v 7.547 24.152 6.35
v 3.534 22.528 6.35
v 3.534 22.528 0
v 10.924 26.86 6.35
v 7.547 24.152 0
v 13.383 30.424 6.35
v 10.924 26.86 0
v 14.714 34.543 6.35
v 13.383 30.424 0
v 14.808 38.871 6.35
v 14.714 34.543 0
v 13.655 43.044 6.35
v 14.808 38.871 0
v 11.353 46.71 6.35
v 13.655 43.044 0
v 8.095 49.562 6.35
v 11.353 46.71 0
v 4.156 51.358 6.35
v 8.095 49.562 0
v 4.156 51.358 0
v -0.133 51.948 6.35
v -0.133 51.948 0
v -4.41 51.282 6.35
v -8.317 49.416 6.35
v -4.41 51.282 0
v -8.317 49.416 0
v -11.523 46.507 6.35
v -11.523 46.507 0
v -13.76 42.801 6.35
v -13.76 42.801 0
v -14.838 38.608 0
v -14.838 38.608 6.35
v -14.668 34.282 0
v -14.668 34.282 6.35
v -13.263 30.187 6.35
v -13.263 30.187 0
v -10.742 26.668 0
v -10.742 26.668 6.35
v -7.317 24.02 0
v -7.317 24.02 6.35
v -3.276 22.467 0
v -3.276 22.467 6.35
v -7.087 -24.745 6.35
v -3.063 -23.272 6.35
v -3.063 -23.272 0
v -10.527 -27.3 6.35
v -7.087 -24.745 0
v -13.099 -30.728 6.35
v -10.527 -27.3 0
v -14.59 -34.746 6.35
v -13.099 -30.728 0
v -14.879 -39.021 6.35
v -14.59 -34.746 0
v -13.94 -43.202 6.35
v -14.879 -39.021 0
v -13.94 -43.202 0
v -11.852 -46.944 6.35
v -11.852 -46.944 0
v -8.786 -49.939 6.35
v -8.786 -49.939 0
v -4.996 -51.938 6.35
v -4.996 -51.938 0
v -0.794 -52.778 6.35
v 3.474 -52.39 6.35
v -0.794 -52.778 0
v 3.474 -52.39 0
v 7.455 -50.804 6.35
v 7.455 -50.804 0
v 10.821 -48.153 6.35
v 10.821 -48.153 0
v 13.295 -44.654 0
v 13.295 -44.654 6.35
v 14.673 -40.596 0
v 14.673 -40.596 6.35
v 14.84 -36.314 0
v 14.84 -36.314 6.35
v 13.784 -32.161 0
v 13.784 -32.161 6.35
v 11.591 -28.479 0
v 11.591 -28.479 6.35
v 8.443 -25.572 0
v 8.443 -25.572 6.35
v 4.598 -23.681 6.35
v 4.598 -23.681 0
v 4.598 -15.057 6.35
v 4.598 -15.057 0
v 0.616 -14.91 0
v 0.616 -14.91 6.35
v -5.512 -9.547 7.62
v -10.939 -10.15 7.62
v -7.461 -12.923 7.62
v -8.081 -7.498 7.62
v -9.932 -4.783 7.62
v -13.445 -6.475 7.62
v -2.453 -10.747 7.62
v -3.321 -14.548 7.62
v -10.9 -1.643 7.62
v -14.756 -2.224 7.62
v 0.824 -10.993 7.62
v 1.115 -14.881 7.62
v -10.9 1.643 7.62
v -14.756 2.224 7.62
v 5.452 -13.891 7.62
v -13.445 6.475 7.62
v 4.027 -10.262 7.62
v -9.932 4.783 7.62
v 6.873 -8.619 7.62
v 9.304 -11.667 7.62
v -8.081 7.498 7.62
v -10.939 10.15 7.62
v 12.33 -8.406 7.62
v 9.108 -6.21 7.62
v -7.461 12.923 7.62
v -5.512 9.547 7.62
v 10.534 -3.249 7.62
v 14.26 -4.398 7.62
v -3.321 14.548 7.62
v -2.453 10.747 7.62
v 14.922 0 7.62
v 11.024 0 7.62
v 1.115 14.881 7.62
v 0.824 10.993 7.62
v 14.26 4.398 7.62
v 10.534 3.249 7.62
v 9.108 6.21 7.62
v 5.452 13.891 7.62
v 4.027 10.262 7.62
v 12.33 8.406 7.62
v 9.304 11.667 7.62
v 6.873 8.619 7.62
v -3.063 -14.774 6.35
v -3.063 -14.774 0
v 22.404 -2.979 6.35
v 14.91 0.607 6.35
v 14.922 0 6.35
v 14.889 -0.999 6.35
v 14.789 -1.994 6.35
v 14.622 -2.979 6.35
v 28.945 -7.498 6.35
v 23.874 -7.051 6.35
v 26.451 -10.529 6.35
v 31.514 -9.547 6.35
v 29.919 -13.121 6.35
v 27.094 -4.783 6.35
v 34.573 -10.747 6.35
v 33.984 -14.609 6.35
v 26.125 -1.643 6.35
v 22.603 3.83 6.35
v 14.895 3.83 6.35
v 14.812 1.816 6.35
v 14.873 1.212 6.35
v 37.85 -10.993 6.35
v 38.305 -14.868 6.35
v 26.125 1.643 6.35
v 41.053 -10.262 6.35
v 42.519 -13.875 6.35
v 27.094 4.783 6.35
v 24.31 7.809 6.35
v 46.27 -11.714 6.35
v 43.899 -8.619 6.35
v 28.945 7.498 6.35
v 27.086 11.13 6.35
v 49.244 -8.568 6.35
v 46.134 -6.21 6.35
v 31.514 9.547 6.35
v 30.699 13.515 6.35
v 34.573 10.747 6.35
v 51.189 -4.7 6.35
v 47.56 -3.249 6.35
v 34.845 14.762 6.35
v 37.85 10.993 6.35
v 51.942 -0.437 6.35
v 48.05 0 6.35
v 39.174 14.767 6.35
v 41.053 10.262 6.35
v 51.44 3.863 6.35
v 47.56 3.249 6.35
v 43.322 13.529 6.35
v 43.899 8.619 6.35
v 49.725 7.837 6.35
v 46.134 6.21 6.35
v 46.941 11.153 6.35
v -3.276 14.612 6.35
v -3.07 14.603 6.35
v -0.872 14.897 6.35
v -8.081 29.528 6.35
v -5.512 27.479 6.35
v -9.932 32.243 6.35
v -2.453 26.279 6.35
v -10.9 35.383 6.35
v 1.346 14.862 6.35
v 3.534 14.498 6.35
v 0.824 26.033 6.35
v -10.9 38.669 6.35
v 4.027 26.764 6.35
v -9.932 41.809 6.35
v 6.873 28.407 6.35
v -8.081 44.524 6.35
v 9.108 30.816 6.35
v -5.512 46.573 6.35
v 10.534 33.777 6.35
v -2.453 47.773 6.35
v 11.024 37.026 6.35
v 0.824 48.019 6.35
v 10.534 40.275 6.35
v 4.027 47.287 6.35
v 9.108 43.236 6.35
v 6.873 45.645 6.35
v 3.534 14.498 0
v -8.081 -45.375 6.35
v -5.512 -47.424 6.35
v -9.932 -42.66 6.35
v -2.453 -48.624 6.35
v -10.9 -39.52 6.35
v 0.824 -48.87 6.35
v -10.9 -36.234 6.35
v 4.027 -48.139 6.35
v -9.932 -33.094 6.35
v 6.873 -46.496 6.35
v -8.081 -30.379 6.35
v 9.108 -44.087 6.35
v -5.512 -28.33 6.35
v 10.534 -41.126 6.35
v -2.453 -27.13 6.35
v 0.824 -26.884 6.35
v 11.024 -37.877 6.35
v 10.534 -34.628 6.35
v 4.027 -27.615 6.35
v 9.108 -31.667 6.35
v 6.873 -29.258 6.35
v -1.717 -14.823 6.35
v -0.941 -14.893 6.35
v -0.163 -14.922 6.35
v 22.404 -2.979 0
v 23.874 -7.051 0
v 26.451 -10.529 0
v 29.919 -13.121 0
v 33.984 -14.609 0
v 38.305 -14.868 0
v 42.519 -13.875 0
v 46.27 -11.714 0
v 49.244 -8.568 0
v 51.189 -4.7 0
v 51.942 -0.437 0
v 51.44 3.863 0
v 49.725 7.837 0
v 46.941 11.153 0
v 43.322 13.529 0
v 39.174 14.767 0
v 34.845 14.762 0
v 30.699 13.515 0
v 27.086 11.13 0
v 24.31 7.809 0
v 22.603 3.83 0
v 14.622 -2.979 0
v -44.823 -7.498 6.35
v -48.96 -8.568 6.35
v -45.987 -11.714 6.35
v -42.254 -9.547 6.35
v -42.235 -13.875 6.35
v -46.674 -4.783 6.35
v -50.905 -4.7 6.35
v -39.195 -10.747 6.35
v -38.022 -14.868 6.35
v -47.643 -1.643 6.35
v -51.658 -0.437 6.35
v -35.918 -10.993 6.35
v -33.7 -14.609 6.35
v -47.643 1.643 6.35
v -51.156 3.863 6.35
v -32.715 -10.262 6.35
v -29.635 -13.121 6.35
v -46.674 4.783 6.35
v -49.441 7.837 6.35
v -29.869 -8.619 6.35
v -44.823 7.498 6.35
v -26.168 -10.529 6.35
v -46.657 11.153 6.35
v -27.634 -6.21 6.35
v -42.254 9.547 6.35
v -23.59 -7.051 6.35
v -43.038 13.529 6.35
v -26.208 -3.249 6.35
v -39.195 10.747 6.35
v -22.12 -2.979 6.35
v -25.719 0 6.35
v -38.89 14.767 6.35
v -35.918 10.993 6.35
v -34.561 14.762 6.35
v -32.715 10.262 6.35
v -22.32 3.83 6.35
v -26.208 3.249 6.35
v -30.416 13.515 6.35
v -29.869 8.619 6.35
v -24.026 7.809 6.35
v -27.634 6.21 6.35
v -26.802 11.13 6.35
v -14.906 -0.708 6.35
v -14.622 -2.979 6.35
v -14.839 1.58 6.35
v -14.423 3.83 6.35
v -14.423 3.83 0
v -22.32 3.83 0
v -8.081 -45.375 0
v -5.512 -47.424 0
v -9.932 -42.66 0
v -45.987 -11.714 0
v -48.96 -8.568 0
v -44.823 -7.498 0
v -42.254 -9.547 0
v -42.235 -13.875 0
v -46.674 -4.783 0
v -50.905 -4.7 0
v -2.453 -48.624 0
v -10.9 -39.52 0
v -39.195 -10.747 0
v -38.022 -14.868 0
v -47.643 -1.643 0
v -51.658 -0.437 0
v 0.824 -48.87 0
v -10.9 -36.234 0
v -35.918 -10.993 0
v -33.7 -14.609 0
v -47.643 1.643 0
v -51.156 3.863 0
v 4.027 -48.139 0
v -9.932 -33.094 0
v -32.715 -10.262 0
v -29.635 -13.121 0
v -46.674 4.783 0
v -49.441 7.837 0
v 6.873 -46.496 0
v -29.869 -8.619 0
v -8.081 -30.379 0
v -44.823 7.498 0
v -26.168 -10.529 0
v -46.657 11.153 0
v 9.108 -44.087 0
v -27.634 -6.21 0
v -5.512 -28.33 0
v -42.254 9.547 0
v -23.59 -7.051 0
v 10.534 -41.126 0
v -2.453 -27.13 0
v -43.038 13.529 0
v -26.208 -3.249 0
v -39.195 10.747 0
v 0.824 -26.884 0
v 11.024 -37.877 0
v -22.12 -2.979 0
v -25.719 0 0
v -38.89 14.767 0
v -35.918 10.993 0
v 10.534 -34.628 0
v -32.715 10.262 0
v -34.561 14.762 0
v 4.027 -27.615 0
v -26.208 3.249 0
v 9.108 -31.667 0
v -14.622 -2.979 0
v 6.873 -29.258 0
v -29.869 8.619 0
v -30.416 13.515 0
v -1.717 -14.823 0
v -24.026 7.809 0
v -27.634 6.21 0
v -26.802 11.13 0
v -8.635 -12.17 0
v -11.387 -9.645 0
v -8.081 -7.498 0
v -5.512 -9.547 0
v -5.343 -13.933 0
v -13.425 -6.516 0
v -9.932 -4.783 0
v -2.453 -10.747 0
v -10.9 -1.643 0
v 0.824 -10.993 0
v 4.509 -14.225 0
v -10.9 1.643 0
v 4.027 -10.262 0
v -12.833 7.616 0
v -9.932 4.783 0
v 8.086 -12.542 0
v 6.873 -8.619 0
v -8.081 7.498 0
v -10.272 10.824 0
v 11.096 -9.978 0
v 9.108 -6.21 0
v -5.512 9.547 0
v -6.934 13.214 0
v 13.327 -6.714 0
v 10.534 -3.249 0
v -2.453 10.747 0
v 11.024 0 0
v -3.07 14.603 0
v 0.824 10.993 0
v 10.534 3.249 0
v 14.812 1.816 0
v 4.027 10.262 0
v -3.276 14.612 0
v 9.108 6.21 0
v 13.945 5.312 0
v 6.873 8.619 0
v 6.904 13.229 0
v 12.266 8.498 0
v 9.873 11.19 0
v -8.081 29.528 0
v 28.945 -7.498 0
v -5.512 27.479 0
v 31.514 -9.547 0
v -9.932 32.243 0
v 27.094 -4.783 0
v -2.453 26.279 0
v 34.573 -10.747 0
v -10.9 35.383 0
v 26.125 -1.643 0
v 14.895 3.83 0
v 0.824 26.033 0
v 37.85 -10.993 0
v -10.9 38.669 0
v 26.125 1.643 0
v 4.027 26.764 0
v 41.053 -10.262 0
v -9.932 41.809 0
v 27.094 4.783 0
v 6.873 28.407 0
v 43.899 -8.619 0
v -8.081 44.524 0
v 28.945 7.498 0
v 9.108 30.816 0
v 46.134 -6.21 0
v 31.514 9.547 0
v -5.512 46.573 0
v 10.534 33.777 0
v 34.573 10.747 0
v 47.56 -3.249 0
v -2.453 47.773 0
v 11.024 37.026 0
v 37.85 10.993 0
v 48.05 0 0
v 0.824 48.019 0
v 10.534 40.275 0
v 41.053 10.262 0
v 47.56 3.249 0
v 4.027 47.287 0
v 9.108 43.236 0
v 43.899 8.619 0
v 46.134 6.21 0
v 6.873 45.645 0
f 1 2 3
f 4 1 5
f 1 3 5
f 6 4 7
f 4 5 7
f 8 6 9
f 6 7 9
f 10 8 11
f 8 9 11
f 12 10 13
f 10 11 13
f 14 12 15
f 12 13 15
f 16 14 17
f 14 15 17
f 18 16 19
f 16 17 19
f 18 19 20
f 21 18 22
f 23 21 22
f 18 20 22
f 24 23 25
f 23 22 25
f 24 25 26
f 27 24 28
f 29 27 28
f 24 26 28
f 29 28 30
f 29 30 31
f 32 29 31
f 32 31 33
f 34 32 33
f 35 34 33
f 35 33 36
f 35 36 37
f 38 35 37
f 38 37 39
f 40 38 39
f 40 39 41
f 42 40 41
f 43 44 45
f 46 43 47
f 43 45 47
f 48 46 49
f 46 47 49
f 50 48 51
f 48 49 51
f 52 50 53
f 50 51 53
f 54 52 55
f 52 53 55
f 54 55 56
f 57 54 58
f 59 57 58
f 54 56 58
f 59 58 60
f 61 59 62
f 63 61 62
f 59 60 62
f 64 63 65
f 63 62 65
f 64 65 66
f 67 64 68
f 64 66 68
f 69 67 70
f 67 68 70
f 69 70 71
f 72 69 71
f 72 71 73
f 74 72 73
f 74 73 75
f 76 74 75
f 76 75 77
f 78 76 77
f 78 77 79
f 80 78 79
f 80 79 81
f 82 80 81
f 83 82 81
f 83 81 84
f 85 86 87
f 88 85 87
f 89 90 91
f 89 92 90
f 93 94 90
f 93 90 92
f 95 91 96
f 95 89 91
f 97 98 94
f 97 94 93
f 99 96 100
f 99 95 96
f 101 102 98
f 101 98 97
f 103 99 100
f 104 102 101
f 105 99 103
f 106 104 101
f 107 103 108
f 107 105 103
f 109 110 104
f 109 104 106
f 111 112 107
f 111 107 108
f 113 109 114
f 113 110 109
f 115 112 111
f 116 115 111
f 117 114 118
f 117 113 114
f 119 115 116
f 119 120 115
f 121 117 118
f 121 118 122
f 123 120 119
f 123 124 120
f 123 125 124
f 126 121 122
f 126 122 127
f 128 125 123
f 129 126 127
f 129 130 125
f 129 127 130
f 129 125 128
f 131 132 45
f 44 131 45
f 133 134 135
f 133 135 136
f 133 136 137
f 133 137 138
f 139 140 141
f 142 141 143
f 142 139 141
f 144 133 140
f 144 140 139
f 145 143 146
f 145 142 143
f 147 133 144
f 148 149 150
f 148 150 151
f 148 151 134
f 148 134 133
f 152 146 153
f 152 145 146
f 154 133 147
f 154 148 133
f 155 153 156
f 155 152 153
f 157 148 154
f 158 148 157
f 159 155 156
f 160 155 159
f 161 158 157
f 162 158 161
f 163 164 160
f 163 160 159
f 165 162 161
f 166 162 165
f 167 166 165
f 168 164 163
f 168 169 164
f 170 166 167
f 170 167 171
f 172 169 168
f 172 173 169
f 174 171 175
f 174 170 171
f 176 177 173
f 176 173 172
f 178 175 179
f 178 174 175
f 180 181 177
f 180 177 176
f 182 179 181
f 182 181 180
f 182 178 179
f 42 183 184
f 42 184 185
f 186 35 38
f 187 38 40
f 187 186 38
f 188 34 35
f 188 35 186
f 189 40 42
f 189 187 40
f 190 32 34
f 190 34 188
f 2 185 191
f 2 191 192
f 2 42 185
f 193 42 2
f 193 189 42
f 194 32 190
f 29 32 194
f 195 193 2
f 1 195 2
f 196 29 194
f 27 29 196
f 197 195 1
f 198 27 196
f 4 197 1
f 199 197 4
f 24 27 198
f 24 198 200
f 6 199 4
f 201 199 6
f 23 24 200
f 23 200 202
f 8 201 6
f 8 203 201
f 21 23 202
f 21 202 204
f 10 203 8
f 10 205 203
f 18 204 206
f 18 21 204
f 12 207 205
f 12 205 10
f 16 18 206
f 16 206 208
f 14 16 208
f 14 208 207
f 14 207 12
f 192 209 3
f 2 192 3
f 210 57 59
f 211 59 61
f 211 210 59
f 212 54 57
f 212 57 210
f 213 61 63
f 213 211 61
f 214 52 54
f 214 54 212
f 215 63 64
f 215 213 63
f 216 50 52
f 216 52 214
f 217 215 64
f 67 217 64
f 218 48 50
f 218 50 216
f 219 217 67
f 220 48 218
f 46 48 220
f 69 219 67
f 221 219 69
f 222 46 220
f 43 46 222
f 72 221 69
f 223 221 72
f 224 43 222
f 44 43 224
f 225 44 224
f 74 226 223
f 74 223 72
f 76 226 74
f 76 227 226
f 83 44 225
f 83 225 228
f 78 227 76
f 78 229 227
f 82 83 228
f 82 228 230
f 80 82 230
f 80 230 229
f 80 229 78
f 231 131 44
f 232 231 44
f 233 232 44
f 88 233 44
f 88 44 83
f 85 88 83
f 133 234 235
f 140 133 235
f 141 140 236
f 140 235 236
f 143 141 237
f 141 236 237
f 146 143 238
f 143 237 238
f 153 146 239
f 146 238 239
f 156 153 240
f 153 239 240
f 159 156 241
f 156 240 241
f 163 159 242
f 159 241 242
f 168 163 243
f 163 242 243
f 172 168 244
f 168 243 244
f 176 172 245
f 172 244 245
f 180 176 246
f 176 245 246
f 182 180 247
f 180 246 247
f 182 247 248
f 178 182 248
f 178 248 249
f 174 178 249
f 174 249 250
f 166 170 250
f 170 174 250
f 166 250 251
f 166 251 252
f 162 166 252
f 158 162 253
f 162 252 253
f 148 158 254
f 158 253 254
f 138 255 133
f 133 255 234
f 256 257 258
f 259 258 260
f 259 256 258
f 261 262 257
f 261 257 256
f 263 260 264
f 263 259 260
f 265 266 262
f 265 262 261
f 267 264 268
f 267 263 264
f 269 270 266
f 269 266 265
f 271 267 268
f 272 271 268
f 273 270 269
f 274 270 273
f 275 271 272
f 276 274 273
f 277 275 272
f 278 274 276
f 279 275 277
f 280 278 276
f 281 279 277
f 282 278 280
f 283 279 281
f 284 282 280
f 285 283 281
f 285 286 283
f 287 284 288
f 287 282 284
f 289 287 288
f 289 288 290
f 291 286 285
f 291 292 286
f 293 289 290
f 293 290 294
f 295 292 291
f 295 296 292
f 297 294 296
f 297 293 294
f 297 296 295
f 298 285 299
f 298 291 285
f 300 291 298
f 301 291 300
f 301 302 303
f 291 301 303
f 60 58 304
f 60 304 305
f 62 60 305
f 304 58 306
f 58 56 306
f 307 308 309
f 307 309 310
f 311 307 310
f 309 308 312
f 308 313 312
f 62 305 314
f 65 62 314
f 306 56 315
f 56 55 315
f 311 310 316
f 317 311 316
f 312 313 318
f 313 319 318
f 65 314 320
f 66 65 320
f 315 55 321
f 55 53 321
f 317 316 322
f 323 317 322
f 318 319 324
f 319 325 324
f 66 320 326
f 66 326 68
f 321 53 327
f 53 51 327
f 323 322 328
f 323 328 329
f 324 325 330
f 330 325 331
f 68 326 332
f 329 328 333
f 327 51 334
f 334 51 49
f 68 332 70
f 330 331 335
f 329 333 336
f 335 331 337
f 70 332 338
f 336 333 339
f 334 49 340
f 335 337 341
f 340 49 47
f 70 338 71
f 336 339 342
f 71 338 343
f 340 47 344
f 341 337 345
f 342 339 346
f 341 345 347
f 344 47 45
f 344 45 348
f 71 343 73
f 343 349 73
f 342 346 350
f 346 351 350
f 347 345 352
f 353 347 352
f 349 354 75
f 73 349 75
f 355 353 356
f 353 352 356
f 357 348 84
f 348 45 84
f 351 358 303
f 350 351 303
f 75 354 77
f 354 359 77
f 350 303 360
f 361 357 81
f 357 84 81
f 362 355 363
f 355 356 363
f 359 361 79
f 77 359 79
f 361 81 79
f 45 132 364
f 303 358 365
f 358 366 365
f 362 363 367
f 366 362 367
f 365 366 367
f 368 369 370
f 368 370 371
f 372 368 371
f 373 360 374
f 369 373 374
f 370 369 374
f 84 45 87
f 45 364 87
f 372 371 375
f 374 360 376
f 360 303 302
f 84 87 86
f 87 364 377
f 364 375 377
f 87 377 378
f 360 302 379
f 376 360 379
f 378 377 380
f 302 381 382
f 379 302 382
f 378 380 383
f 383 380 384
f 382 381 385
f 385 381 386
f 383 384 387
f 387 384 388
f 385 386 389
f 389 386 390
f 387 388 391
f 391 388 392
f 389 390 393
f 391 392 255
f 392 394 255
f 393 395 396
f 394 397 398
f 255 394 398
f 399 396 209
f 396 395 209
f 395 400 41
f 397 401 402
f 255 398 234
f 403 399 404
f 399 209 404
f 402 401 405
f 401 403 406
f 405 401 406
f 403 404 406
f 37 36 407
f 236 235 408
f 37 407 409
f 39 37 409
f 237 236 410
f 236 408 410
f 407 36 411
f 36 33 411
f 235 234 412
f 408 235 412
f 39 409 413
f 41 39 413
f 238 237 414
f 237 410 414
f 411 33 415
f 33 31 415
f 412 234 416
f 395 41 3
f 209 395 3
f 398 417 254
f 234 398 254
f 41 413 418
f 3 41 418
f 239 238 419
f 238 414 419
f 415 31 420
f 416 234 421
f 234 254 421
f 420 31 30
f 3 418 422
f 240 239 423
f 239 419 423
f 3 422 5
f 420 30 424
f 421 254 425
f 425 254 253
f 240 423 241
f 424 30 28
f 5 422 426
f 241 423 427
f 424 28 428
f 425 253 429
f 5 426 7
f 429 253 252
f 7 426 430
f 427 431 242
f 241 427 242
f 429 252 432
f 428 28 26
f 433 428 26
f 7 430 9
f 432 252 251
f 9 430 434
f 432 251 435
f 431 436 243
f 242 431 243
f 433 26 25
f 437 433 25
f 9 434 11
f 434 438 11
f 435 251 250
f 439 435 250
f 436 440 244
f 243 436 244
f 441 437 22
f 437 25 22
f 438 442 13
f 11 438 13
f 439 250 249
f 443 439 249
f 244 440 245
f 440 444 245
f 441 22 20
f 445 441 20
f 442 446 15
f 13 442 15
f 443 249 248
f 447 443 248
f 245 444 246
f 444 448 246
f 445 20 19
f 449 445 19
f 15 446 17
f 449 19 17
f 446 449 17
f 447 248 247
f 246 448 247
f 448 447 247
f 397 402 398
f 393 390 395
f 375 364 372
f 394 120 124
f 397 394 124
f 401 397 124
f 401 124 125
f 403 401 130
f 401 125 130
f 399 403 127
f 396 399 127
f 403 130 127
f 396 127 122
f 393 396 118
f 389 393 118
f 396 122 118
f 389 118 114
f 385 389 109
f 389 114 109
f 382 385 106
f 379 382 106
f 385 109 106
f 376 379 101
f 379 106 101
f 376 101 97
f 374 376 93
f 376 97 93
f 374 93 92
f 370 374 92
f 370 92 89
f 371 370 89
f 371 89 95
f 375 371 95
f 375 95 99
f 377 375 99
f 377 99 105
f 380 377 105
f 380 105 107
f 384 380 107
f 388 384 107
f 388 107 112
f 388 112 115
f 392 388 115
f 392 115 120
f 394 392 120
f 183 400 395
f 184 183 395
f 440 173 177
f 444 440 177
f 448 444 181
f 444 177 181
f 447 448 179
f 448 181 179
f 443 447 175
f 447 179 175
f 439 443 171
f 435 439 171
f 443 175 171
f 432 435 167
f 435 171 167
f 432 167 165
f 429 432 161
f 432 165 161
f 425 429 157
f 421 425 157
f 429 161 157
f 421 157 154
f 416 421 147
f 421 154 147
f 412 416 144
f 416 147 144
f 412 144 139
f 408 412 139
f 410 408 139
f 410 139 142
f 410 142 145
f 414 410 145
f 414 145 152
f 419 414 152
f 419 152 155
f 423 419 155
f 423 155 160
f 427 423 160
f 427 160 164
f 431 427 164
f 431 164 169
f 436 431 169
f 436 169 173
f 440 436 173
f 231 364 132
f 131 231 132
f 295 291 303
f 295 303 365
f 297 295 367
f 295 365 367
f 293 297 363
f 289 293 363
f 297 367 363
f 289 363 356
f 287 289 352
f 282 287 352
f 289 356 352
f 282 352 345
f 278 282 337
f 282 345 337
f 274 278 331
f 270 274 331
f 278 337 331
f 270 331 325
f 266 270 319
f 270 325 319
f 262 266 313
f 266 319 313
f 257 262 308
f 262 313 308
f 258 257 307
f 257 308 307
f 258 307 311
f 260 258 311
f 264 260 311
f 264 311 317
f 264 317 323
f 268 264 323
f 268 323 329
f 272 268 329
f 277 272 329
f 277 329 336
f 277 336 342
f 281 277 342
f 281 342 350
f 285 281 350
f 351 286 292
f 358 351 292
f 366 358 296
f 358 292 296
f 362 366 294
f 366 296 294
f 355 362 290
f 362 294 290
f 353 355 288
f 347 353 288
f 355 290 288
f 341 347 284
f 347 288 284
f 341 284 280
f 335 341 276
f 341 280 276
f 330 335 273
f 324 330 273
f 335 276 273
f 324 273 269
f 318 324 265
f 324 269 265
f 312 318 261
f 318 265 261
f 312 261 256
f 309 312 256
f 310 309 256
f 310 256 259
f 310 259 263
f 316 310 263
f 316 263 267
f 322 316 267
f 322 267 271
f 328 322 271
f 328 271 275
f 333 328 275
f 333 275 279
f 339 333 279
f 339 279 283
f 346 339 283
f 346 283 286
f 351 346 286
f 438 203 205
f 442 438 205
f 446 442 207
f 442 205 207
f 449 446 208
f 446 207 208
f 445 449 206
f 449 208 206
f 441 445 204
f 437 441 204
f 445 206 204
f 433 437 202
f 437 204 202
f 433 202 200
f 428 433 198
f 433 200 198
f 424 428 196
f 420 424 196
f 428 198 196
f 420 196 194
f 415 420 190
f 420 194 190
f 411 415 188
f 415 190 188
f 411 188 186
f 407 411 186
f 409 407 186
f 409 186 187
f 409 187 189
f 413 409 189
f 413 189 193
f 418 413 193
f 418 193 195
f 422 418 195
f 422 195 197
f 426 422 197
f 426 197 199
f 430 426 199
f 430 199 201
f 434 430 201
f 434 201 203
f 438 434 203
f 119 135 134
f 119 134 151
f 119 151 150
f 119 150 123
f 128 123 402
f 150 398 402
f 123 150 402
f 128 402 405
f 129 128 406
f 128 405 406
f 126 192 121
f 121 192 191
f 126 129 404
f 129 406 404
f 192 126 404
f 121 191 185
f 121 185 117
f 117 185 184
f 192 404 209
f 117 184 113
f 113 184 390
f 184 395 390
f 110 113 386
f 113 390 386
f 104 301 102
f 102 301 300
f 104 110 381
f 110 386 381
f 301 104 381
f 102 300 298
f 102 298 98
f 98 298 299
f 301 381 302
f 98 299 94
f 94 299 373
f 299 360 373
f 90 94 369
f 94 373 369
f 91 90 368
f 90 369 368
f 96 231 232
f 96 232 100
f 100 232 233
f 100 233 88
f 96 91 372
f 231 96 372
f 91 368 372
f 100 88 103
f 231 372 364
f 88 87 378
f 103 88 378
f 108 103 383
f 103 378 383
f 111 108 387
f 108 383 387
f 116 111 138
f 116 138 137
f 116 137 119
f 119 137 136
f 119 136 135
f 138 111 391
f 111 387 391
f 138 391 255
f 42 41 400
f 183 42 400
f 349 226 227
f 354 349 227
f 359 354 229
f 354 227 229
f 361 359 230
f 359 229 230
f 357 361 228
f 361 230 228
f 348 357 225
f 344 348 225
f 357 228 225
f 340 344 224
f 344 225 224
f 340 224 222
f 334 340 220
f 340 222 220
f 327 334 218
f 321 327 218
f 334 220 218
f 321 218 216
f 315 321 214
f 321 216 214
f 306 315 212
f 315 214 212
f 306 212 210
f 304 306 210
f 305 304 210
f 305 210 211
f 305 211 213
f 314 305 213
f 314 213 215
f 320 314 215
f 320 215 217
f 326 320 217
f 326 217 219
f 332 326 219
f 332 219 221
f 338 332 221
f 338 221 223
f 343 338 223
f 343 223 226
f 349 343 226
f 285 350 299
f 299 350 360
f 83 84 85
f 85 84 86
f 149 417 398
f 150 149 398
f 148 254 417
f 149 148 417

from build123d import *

# Parameters (mm, degrees)
F0_R      = 14.9225
F1_DEPTH  = 7.62
F2_R      = 11.0236
F3_DEPTH  = 25.4
F5_DEPTH  = 6.35
F6_R      = 14.9225
F7_DEPTH  = 6.35
F8_R      = 11.0236
F9_DEPTH  = 25.4
F10_R     = 11.0236
F11_DEPTH = 25.4
F12_R     = 11.0236
F13_DEPTH = 25.4
F14_R     = 11.0236
F15_DEPTH = 25.4


with BuildPart() as f1:
    # F0 (on Top) → F1 (new body)
    with BuildSketch(Plane.XY):
        Circle(F0_R)
    extrude(amount=F1_DEPTH)

    # F2 (on face) → F3 (cut)
    with BuildSketch(Plane.XY.offset(7.62)):
        Circle(F2_R)
    extrude(amount=-F3_DEPTH, mode=Mode.SUBTRACT)

    # F4 (on Top) → F5 (join)
    with BuildSketch(Plane.XY):
        Polygon((23.40718, 3.830266), (14.89548, 3.830266), (14.611755, -2.979096), (23.40718, -2.979096), align=None)
        Polygon((-3.275654, 23.123458), (-3.275654, 14.611758), (3.533708, 14.328033), (3.533708, 23.123458), align=None)
        Polygon((-14.23008, 3.830266), (-22.74178, 3.830266), (-23.025505, -2.979096), (-14.23008, -2.979096), align=None)
        Polygon((4.597669, -23.888158), (4.597669, -15.057278), (-3.062862, -14.773545), (-3.062862, -23.888158), align=None)
    extrude(amount=F5_DEPTH)

    # F6 (on Top) → F7 (join)
    with BuildSketch(Plane.XY):
        with Locations((37.025906, 0)):
            Circle(F6_R)
        with Locations((0, 37.025906)):
            Circle(F6_R)
        with Locations((-36.742181, 0)):
            Circle(F6_R)
        with Locations((0, -37.877075)):
            Circle(F6_R)
    extrude(amount=F7_DEPTH)

    # F8 (on face) → F9 (cut)
    with BuildSketch(Plane.XY.offset(6.35)):
        with Locations((-36.742181, 0)):
            Circle(F8_R)
    extrude(amount=-F9_DEPTH, mode=Mode.SUBTRACT)

    # F10 (on face) → F11 (cut)
    with BuildSketch(Plane.XY.offset(6.35)):
        with Locations((0, 37.025906)):
            Circle(F10_R)
    extrude(amount=-F11_DEPTH, mode=Mode.SUBTRACT)

    # F12 (on face) → F13 (cut)
    with BuildSketch(Plane.XY.offset(6.35)):
        with Locations((37.025906, 0)):
            Circle(F12_R)
    extrude(amount=-F13_DEPTH, mode=Mode.SUBTRACT)

    # F14 (on face) → F15 (cut)
    with BuildSketch(Plane.XY.offset(6.35)):
        with Locations((0, -37.877075)):
            Circle(F14_R)
    extrude(amount=-F15_DEPTH, mode=Mode.SUBTRACT)


solid = f1.part
